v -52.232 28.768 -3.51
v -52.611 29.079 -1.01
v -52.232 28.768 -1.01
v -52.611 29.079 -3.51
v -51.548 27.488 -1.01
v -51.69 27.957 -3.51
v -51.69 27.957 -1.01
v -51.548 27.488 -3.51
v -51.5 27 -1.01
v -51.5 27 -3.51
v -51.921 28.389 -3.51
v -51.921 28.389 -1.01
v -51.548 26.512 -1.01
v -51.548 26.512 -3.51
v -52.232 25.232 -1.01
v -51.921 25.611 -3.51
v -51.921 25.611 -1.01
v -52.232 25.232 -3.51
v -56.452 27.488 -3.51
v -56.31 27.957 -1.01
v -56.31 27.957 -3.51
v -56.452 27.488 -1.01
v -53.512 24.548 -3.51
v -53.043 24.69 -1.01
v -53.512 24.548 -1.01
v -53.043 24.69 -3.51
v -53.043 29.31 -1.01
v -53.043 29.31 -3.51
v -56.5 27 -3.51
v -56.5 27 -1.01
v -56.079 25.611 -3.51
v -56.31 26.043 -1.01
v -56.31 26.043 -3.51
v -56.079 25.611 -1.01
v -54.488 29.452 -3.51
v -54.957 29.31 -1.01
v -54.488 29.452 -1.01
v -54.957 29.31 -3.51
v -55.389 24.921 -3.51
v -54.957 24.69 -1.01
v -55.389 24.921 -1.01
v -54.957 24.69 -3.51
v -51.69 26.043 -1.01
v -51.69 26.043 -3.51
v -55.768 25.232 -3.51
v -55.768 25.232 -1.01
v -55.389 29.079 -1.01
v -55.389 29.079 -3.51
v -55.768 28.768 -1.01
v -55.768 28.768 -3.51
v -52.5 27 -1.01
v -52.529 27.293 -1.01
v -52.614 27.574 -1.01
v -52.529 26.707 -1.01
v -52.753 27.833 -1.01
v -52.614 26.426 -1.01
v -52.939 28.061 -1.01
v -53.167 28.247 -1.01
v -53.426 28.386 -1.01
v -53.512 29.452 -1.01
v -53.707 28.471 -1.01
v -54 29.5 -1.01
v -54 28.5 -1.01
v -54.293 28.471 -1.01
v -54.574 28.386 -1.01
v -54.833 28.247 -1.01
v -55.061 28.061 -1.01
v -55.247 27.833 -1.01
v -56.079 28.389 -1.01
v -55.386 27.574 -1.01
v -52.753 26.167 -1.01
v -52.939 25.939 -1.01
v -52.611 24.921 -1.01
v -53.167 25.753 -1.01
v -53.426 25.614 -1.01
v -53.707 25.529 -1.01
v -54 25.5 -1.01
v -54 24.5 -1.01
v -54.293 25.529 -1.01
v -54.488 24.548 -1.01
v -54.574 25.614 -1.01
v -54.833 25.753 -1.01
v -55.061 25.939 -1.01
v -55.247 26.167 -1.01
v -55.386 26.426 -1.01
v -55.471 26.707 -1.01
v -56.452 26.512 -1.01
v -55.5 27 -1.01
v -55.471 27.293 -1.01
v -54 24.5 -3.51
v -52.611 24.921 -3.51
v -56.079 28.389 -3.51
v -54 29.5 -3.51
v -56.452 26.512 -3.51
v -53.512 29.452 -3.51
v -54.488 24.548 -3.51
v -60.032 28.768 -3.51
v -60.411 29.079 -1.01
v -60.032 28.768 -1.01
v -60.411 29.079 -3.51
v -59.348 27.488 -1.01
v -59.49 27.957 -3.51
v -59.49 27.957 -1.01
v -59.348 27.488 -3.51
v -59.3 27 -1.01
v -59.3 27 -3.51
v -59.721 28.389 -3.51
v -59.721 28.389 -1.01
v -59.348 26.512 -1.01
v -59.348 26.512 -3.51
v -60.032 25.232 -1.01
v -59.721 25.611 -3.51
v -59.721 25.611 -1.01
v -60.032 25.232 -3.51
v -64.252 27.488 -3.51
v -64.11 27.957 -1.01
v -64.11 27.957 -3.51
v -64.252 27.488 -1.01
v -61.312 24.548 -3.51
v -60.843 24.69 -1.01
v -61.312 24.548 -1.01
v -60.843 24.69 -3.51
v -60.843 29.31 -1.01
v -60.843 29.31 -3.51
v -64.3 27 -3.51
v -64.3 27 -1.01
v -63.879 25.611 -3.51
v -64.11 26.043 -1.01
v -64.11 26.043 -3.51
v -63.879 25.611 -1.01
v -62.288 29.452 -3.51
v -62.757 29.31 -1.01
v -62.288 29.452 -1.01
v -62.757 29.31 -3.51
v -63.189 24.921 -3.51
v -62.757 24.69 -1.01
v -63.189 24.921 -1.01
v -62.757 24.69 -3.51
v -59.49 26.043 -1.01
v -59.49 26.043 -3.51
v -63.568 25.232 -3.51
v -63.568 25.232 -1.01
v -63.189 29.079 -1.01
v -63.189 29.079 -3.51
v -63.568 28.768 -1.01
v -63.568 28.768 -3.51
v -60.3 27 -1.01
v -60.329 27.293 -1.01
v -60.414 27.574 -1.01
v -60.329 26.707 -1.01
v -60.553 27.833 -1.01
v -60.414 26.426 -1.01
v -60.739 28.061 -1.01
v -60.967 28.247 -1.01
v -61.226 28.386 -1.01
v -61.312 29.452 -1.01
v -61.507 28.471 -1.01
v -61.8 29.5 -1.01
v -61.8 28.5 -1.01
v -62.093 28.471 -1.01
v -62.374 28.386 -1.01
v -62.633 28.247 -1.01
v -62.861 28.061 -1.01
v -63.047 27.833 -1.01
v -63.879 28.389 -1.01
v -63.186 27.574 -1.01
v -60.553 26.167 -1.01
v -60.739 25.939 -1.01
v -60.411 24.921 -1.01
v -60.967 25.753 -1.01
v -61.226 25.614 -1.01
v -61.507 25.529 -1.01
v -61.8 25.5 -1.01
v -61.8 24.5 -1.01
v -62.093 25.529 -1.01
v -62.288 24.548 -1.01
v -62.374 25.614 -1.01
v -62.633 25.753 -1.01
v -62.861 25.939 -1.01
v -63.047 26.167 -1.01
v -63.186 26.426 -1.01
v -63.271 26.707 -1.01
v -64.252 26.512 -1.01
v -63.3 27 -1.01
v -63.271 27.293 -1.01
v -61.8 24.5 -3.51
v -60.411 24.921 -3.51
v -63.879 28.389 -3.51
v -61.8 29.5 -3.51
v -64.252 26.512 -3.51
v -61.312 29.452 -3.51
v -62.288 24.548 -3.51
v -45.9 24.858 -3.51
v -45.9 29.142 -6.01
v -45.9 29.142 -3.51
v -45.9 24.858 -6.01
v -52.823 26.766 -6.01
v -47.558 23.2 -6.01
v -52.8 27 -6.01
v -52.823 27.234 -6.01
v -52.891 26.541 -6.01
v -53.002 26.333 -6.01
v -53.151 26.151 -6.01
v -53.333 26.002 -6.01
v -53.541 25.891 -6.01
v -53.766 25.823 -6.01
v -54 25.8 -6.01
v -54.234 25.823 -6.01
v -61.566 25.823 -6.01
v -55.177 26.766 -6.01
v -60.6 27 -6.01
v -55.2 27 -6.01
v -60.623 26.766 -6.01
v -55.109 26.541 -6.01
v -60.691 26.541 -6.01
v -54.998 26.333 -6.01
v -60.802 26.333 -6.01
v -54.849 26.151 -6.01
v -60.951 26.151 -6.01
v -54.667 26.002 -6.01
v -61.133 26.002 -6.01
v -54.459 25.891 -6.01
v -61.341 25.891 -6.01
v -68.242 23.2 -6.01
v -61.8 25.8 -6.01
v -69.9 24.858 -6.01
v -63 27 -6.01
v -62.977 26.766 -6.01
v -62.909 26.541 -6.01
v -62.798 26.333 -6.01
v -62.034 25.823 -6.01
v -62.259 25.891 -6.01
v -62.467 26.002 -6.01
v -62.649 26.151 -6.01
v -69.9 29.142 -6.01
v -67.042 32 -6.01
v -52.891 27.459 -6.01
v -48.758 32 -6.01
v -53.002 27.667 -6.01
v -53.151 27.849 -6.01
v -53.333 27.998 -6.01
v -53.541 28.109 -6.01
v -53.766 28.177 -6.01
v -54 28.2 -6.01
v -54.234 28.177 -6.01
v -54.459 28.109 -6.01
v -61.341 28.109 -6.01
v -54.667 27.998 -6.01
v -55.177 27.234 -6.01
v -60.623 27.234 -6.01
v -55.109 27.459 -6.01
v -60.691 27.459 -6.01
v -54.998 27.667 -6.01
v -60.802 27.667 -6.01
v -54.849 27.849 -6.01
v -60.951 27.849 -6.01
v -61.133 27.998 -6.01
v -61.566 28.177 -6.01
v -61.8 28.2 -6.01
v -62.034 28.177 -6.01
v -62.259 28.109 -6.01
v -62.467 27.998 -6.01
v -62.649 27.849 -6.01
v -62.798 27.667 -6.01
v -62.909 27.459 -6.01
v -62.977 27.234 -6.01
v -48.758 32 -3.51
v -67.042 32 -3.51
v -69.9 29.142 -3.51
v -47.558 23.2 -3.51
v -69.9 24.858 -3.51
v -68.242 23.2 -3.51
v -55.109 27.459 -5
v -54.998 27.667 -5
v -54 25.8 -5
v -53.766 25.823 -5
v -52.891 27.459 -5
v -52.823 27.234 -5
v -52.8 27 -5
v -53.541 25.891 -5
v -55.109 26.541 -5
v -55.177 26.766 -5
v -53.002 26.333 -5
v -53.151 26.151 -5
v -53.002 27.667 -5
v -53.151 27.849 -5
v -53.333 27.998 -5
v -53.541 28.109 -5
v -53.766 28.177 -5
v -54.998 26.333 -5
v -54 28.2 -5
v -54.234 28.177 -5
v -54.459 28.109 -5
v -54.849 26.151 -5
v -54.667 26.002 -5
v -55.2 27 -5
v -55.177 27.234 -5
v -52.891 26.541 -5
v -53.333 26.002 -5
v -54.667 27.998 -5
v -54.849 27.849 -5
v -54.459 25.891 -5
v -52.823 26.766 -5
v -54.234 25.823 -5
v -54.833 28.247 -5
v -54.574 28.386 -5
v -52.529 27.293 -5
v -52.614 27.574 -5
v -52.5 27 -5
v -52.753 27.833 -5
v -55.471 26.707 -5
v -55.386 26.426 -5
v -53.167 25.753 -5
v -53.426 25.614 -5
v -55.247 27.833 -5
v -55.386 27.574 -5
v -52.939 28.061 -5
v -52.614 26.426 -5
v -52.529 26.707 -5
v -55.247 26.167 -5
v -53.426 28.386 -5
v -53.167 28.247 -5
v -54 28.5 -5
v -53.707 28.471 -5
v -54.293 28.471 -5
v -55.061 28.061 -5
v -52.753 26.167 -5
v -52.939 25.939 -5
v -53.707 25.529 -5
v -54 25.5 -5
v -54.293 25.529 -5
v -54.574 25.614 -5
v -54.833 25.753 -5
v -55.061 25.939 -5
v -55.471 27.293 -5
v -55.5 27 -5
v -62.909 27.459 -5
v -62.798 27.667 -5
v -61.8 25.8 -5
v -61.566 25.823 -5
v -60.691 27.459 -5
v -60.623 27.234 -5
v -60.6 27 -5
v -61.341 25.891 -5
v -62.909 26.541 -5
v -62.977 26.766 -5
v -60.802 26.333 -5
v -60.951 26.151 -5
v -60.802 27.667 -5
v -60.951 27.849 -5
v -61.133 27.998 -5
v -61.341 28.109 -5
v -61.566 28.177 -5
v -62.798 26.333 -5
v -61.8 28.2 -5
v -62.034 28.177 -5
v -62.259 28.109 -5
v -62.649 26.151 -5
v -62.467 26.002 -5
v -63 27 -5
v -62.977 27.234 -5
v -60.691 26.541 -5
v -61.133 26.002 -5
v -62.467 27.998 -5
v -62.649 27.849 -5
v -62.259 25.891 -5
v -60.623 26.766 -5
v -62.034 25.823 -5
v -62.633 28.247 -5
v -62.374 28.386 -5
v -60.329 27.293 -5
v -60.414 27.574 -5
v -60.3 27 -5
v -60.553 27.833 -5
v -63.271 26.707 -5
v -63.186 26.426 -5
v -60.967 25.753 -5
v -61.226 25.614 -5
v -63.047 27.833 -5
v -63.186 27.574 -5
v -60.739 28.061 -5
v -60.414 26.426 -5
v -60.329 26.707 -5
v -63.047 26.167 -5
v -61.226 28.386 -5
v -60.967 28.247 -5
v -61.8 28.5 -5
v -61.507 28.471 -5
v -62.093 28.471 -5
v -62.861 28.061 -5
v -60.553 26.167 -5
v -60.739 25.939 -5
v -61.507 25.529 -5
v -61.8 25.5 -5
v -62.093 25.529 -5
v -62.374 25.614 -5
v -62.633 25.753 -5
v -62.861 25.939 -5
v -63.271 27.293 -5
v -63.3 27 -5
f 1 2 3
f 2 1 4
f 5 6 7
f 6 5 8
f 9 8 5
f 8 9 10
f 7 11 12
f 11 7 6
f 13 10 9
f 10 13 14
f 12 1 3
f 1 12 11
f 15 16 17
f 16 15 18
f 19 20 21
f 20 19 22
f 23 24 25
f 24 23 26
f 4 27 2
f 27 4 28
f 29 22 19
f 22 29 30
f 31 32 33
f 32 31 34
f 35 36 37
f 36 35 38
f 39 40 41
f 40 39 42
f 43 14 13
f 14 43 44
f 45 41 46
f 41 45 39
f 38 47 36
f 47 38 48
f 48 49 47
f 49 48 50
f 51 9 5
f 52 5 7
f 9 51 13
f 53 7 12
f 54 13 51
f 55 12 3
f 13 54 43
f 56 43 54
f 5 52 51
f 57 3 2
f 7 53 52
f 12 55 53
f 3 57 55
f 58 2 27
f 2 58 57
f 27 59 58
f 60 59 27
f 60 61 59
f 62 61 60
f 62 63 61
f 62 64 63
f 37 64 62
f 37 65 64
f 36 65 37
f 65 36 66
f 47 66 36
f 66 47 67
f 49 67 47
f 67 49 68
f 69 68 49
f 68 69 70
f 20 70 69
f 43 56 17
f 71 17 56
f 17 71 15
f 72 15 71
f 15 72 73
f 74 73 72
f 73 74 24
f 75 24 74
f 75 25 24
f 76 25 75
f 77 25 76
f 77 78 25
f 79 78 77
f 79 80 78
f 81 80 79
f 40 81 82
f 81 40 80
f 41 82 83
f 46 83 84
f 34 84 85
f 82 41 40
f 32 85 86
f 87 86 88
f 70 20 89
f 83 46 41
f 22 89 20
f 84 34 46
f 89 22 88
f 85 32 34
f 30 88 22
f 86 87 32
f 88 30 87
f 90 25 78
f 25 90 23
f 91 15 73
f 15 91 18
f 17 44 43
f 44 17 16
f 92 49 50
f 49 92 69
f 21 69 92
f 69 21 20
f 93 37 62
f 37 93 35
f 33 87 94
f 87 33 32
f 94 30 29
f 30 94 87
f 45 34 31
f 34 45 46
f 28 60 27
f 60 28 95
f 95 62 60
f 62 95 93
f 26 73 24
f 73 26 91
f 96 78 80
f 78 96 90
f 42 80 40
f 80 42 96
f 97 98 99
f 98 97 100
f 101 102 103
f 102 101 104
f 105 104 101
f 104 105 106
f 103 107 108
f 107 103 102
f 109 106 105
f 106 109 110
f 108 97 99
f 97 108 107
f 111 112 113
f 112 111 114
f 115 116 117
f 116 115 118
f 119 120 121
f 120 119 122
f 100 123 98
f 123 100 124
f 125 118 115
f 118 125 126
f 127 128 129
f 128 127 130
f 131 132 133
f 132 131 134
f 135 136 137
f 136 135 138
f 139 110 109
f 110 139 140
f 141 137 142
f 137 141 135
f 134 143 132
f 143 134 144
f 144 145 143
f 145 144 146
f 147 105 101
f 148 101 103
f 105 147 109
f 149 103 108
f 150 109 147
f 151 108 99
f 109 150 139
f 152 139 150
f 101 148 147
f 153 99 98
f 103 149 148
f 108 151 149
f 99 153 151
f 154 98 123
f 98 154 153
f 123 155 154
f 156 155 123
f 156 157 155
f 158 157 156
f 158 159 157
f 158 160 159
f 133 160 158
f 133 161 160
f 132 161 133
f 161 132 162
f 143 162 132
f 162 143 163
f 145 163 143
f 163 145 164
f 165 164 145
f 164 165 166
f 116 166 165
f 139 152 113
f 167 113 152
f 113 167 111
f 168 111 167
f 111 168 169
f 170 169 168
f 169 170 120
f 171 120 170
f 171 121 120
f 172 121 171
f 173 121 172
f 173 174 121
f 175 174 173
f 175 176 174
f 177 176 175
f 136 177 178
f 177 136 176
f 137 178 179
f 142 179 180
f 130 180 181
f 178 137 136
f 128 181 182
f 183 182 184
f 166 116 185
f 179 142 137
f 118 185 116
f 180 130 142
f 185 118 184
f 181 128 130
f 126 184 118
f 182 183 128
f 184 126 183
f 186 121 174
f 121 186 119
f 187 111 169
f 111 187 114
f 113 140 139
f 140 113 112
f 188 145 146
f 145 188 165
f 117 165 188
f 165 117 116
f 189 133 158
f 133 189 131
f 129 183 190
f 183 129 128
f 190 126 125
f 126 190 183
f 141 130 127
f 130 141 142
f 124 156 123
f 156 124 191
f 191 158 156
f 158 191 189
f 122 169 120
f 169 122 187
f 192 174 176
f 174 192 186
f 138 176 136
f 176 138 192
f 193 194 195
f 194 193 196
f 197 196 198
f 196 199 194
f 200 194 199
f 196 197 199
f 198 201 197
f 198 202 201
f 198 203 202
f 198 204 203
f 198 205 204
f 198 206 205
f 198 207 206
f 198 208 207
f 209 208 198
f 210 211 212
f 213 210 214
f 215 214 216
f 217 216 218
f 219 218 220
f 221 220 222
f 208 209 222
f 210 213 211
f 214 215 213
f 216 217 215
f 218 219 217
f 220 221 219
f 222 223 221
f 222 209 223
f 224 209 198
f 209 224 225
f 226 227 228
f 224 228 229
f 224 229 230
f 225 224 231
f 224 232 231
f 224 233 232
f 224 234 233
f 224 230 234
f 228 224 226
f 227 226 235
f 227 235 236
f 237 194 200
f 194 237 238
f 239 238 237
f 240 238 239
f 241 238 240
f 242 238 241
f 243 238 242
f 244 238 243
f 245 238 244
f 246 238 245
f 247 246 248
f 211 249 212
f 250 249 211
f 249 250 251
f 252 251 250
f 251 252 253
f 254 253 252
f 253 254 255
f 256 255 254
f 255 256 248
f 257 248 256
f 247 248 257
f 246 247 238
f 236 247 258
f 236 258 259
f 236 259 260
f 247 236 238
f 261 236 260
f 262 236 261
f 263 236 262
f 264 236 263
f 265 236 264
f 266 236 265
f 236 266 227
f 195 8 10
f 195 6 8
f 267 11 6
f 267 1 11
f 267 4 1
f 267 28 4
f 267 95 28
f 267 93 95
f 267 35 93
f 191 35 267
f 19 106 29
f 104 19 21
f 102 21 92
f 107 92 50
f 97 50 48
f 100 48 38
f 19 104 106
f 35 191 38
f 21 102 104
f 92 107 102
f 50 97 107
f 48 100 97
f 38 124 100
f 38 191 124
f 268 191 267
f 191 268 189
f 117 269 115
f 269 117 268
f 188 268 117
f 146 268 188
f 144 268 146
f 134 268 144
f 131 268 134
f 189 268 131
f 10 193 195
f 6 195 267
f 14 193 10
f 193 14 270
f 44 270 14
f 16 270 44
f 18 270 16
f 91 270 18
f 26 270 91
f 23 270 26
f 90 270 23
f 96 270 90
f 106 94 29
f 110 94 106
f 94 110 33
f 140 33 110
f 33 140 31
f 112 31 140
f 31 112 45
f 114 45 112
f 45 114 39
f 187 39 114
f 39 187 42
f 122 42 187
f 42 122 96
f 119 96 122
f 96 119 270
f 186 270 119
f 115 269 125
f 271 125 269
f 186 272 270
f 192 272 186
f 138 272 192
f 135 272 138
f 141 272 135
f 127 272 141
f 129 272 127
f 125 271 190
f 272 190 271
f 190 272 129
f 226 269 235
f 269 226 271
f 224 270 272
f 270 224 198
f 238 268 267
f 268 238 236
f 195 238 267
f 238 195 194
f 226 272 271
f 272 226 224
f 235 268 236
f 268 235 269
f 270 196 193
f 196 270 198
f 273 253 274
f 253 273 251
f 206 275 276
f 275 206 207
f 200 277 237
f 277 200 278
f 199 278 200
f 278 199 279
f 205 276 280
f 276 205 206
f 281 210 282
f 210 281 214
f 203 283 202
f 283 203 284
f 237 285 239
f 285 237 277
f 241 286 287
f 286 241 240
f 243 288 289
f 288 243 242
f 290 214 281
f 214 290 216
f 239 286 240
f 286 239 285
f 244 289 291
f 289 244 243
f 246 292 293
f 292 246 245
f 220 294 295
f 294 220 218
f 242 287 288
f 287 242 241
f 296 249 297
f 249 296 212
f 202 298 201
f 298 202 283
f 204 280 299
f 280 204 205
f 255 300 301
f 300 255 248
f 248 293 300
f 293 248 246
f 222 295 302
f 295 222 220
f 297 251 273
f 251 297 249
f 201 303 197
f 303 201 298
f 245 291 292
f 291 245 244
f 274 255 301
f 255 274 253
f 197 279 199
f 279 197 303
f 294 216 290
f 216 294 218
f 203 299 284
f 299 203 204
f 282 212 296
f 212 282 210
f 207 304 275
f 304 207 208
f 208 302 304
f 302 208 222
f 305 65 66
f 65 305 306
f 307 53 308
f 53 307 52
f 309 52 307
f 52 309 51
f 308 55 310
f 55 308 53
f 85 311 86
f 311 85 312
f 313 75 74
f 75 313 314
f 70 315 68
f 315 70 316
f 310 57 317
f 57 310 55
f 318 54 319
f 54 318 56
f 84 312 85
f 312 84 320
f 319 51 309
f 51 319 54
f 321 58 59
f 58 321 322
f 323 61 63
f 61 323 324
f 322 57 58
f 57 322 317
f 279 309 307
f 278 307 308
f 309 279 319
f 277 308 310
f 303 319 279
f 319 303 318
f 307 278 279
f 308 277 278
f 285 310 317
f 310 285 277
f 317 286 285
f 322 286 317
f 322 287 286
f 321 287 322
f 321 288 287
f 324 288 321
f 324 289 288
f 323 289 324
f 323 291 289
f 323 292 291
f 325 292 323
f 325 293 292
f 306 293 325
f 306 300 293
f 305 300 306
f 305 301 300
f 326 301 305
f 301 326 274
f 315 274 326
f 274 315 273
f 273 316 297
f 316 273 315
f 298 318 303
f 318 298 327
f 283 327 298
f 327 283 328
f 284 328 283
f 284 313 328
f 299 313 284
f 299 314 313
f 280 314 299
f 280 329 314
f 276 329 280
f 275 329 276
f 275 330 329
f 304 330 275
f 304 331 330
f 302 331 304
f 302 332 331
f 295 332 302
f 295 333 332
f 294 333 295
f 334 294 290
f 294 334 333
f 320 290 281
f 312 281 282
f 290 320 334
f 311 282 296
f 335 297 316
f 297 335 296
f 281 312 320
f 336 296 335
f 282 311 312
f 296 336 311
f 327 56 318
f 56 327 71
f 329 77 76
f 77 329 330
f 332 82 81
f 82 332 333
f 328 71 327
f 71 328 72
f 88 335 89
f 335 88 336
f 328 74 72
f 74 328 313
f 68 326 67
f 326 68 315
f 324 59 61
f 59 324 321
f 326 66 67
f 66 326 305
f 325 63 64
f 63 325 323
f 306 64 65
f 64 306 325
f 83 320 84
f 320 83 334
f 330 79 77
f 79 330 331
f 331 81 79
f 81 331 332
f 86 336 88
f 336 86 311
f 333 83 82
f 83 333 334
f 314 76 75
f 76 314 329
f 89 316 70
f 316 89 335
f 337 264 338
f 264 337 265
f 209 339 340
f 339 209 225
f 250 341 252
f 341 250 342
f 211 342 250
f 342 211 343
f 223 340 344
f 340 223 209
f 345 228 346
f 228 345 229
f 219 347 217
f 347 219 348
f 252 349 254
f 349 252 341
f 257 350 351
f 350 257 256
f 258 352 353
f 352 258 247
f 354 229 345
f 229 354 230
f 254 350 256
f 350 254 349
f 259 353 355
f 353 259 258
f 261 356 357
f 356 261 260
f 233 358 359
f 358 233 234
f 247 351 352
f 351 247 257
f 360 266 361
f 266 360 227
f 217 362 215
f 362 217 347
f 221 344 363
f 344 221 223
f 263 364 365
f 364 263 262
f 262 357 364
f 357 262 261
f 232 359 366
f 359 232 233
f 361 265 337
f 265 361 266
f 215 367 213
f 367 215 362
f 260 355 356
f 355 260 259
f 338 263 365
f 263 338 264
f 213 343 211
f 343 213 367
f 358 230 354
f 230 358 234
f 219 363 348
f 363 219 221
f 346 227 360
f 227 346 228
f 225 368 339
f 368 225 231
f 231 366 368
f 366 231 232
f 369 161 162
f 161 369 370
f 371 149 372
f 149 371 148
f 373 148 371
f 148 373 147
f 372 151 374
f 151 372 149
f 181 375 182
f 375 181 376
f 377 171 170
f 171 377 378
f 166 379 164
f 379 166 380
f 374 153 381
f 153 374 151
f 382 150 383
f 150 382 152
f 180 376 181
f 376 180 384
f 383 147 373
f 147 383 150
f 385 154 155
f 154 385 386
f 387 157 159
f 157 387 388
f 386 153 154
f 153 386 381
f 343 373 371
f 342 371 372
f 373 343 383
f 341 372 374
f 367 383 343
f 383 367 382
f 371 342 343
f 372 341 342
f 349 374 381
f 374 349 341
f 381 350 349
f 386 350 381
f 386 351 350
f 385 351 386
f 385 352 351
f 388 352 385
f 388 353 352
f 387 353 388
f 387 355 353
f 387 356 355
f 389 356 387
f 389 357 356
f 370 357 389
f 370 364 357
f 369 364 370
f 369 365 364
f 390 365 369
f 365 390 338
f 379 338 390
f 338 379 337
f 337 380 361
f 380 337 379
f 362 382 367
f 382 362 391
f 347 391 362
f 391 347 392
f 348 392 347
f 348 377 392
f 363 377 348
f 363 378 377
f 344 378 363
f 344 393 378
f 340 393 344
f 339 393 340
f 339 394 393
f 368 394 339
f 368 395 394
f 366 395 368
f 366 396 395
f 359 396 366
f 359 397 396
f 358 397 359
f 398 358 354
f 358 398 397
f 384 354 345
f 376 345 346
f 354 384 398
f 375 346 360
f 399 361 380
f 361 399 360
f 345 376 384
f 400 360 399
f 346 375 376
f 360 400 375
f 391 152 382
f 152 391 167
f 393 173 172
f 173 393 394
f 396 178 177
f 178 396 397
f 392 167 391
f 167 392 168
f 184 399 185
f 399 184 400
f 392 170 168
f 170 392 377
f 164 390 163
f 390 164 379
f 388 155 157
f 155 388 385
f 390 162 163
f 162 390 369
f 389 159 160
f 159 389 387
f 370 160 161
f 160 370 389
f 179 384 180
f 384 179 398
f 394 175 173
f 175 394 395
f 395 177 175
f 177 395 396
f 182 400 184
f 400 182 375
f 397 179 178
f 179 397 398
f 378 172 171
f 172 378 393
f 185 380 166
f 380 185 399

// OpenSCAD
// file: common.scad
// Copyright 2019 a.j.buxton@gmail.com
// CC BY-NC-ND 4.0

w = 151;
h = 65;


// abxy and dpad holes
button_hole_diameter = 29;
// analog stick
analog_hole_diameter = 21;

button_radius = 8.4/2;
button_height = 4.5;

button_letters = ["A", "B", "X", "Y"];
button_rotations = [180, 90, 270, 0];
button_colours = [[1.0, 0.1, 0.1], [1, 0.8, 0], [0.1, 0.3, 1], [0, 0.8, 0]];


small_button_radius = 5.2/2;
small_button_height = 3.8;
small_button_letters = ["H", "M"];
small_button_rotations = [180, 0];


module twobytwo() {
    children();
    rotate(90) children();
    rotate(180) children();
    rotate(270) children();
}


module mirrorf() {
    children();
    mirror([1, 0]) children();
    mirror([0, 1]) children();
    mirror([1, 0]) mirror([0, 1]) children();
}


module base_insert(thickness, extra=0) {
    translate([0, 0, -extra]) cylinder(d=button_hole_diameter-0.5, h=thickness+extra);
    linear_extrude(height=thickness, convexity=2) {
        square([7.9, 30], center=true);
        square([30, 7.9], center=true);
    }
    twobytwo() translate([6.9, 6.9, 0]) intersection() {
        cylinder(r=4.4, h=4.4);
        cube(10);
    }
    if (extra > 0) twobytwo() {
        translate([15, -4, -extra]) cube([1, 8, extra+2]);
    }
}

module outline() {
    offset(3) offset(-3) square([w, h], center=true);
}


module support() {
    scale(0.3) translate([-5, -9.5]) intersection() {
        cube(10);
        rotate([-45, 0, 0]) cube(20);
    }
}


module shell(height=7.6) {
    difference() {
        linear_extrude(height=height, convexity=2) difference() {
            offset(1.6) outline();
            offset(-0.05) outline();
        }
        translate([0, 0, height-1.6]) linear_extrude(height=height, convexity=2) {
            translate([20.8, 1, 0]) offset(1.1, $fn=2) offset(-1.1) square([39, h], center=true);
        }
    }
}


module dpad_pos() {
    translate([(w/2)-18.5, -8.75]) children();
}

module analog_pos() {
    translate([(w/2)-18.5, 20.25]) children();
}

module analog_supports() {
    translate([7.25, 9.25]) children();
    translate([-10.85, -6.55]) children();
}

module btn_pos() {
    translate([-57.9, 7.9]) children();
}

module smlbtn_pos() {
    translate([-57.9, -19.75]) children();
}

module led_pos() {
    translate([-57.9, 27]) {
        children();
    }
}

module led_individual_pos() {
    led_pos() {
        translate([3.9, 0]) children();
        //translate([0, 0]) children();
        translate([-3.9, 0]) children();
    }
}

module screw_pos(internal=true) {
    translate([0, 0.2, 0]) {
        translate([144/2, 0]) {
            translate([0, -29]) children();
            if (internal) translate([0, 0]) children();
            translate([0, 29]) children();
            if (internal) translate([-29, 0]) {
                translate([0, -29]) children();
                //translate([0, 0]) children();
                translate([0, 29]) children();
            }
        }
        translate([-145/2, 0]) {
            translate([0, -29]) children();
            if (internal) translate([0, 0]) children();
            translate([0, 29]) children();
            if (internal) translate([29, 0]) {
                translate([0, -29]) children();
                //translate([0, 0]) children();
                translate([0, 29]) children();
            }
        }
    }
}
// main file
// Copyright 2019 a.j.buxton@gmail.com
// CC BY-NC-ND 4.0

include <common.scad>;

RES = undef;

$fn = RES ? RES : 32;

module light_pipe_insert(neg=false) {
    offs = neg ? -0.1 : 0;
    translate([0, 0, 1.01]) {
        led_individual_pos() {
            //cube([5, 5, 6], center=true);
            //cube([4, 4, 50], center=true);
            cylinder(d=5-offs, h=3-offs, center=false);
            if (neg) cylinder(d=3, h=20, center=true);
        }
    }
    translate([0, 0, 4.76]) {
        led_pos() {
            intersection() {
                translate([0, 1.2, 0]) cube([24-offs, 10-offs, 2.5-offs], center=true);
                cube([24-offs, 10-offs, 2.5-offs], center=true);
                rotate(45) cube([20-offs, 20-offs, 3-offs], center=true);
            }
        }
    }
}

mirror([0, 0, 1]) difference() {
    light_pipe_insert();
    led_individual_pos() {
        cylinder(d=2.4, h=20, center=true);
        cylinder(d=3, h=5);
    }
};
